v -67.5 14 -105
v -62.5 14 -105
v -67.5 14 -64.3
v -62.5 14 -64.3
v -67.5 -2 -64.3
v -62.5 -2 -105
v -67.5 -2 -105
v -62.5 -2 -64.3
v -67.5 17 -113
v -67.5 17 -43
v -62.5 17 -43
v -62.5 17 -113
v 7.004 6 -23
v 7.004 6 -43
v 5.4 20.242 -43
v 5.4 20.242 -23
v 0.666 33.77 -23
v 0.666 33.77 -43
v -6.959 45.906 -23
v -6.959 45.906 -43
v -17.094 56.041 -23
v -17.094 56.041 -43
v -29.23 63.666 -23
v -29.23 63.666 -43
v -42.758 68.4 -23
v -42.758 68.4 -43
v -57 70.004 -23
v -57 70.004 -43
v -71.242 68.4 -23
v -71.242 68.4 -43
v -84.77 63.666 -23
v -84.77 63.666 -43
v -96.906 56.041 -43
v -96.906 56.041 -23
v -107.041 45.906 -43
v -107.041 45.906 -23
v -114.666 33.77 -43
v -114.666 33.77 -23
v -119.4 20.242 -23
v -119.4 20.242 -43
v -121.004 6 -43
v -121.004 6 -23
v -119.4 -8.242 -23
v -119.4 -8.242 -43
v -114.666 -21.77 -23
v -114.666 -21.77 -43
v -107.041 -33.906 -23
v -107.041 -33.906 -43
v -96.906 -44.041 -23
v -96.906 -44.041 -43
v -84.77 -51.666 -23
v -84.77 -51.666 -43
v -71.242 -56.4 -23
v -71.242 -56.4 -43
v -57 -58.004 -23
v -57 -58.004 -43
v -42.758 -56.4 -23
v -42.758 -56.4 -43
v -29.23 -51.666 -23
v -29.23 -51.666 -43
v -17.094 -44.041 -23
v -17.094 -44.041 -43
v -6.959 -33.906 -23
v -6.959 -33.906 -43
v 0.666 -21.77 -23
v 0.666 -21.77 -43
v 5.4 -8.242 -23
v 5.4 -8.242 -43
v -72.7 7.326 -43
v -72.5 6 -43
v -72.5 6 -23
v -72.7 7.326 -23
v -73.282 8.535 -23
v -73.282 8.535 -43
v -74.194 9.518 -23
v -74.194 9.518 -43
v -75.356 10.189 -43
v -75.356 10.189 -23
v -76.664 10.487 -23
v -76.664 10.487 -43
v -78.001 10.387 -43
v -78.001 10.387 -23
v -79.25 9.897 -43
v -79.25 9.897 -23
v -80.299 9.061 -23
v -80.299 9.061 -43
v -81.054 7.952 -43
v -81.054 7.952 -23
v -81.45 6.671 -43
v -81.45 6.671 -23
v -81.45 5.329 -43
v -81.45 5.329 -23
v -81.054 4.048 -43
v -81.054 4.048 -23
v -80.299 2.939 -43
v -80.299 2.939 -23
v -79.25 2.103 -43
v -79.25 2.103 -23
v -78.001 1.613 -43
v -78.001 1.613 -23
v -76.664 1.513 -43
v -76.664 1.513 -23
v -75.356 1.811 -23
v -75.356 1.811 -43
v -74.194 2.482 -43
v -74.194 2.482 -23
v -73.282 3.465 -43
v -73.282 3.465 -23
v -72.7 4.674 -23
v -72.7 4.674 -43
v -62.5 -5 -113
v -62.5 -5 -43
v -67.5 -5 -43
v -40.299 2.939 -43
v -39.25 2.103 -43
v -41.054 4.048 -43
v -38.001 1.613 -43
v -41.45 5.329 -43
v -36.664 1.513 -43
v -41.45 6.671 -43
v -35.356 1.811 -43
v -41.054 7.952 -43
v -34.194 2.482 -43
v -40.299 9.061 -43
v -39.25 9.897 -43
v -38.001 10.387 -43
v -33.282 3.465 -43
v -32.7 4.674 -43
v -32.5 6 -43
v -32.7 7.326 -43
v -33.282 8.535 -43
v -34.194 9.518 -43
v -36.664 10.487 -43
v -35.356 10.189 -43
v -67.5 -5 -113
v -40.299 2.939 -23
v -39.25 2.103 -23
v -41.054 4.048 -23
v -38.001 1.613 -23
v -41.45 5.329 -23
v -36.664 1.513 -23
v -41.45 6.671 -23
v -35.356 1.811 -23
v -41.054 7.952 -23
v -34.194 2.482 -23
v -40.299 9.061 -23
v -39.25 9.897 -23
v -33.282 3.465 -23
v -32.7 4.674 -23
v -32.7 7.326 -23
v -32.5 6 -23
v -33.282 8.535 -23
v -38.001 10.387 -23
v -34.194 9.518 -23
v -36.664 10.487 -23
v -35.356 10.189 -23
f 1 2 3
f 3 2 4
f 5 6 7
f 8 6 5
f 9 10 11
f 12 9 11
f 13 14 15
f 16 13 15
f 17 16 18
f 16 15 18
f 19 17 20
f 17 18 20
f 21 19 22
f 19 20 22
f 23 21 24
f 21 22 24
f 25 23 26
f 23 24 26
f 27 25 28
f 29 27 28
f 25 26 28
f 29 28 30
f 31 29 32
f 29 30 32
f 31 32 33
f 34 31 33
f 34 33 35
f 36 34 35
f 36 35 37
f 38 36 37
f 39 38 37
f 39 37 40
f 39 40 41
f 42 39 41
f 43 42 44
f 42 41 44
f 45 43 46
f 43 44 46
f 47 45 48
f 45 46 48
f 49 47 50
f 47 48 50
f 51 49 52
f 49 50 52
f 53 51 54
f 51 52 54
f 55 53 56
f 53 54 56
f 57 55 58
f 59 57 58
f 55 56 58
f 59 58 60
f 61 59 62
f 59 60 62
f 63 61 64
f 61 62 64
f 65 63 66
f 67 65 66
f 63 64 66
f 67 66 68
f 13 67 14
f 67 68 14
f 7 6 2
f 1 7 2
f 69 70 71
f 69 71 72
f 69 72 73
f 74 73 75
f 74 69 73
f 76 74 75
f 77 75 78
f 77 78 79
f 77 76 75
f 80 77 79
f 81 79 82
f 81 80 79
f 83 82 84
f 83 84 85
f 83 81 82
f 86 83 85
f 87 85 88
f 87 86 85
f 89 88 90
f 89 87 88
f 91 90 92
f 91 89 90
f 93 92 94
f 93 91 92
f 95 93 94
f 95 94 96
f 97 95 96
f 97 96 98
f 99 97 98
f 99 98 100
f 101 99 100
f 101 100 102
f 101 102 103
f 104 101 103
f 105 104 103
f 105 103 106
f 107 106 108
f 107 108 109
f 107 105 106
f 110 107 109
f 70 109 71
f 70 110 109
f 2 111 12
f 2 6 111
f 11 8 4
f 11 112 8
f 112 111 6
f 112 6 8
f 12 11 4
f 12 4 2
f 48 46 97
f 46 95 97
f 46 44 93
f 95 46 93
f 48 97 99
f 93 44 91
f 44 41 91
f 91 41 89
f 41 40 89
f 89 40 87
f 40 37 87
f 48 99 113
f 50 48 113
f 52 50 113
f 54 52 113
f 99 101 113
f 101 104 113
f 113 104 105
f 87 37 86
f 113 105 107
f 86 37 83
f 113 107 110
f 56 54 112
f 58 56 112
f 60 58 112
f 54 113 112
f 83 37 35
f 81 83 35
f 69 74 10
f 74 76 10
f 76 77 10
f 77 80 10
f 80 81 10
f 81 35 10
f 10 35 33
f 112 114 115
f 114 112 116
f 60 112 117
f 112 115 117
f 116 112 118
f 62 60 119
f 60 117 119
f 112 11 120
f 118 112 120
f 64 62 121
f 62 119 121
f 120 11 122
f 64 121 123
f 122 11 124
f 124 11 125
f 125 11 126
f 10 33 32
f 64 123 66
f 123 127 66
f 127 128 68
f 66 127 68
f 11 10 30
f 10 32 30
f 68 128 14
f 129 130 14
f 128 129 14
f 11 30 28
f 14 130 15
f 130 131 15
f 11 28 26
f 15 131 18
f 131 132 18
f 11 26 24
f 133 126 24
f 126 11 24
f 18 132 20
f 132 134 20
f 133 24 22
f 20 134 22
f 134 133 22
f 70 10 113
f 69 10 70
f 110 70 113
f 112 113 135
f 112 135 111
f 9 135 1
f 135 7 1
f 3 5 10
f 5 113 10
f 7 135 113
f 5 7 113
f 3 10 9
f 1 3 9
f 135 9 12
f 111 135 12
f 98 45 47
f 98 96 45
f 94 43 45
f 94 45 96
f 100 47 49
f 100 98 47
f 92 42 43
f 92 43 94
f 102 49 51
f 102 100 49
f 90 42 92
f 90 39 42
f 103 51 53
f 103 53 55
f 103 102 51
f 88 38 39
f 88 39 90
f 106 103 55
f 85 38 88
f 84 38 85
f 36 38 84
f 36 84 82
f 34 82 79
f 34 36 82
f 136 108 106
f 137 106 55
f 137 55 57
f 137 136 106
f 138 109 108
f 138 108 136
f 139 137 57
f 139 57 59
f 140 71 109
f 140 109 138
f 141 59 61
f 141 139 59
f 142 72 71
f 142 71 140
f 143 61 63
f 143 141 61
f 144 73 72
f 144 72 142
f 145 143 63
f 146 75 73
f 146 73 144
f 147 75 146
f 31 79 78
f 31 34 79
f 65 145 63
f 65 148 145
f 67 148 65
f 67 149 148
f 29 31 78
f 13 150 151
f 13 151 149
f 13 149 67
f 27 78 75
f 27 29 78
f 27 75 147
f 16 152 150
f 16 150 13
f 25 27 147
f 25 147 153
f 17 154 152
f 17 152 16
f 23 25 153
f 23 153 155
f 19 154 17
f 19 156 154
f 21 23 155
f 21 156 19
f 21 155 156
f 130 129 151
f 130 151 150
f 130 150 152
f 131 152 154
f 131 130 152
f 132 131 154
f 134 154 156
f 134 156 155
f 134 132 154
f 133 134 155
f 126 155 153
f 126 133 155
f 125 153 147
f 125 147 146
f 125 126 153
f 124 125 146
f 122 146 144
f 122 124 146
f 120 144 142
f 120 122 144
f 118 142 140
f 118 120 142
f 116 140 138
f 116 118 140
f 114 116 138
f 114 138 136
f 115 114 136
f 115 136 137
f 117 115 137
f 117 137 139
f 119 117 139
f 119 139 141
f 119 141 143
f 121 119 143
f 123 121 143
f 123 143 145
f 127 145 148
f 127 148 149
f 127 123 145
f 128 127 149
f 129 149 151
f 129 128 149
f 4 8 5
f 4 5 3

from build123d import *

# Parameters (mm, degrees)
SKETCH004_R     = 64.00438
PAD003_DEPTH    = 20
SKETCH006_R     = 4.5
POCKET001_DEPTH = 20
SKETCH005_R     = 4.5
POCKET002_DEPTH = 20
SKETCH007_W     = 5
SKETCH007_H     = 22
PAD004_DEPTH    = 70
SKETCH008_W     = 16
SKETCH008_H     = 40.7
POCKET003_DEPTH = 5


with BuildPart() as part:
    # Sketch004 → Pad003 (new body)
    with BuildSketch(Plane.XY):
        Circle(SKETCH004_R)
    extrude(amount=PAD003_DEPTH)

    # Sketch006 → Pocket001 (cut)
    with BuildSketch(Plane.XY):
        with Locations((20, 0)):
            Circle(SKETCH006_R)
    extrude(amount=POCKET001_DEPTH, mode=Mode.SUBTRACT)

    # Sketch005 → Pocket002 (cut)
    with BuildSketch(Plane.XY):
        with Locations((-20, 0)):
            Circle(SKETCH005_R)
    extrude(amount=POCKET002_DEPTH, mode=Mode.SUBTRACT)

    # Sketch007 → Pad004 (join)
    with BuildSketch(Plane.XY):
        with Locations((-8, 0)):
            Rectangle(SKETCH007_W, SKETCH007_H)
    extrude(amount=-PAD004_DEPTH)

    # Sketch008 (on Face7 of Pad004) → Pocket003 (cut)
    with BuildSketch(Plane.YZ.offset(-5.5)):
        with Locations((0, -41.65)):
            Rectangle(SKETCH008_W, SKETCH008_H)
    extrude(amount=-POCKET003_DEPTH, mode=Mode.SUBTRACT)


with BuildPart() as part_1:
    # Body001 placement: moved
    add(part.part.moved(Location((-57, 6, -43))))


solid = part_1.part
